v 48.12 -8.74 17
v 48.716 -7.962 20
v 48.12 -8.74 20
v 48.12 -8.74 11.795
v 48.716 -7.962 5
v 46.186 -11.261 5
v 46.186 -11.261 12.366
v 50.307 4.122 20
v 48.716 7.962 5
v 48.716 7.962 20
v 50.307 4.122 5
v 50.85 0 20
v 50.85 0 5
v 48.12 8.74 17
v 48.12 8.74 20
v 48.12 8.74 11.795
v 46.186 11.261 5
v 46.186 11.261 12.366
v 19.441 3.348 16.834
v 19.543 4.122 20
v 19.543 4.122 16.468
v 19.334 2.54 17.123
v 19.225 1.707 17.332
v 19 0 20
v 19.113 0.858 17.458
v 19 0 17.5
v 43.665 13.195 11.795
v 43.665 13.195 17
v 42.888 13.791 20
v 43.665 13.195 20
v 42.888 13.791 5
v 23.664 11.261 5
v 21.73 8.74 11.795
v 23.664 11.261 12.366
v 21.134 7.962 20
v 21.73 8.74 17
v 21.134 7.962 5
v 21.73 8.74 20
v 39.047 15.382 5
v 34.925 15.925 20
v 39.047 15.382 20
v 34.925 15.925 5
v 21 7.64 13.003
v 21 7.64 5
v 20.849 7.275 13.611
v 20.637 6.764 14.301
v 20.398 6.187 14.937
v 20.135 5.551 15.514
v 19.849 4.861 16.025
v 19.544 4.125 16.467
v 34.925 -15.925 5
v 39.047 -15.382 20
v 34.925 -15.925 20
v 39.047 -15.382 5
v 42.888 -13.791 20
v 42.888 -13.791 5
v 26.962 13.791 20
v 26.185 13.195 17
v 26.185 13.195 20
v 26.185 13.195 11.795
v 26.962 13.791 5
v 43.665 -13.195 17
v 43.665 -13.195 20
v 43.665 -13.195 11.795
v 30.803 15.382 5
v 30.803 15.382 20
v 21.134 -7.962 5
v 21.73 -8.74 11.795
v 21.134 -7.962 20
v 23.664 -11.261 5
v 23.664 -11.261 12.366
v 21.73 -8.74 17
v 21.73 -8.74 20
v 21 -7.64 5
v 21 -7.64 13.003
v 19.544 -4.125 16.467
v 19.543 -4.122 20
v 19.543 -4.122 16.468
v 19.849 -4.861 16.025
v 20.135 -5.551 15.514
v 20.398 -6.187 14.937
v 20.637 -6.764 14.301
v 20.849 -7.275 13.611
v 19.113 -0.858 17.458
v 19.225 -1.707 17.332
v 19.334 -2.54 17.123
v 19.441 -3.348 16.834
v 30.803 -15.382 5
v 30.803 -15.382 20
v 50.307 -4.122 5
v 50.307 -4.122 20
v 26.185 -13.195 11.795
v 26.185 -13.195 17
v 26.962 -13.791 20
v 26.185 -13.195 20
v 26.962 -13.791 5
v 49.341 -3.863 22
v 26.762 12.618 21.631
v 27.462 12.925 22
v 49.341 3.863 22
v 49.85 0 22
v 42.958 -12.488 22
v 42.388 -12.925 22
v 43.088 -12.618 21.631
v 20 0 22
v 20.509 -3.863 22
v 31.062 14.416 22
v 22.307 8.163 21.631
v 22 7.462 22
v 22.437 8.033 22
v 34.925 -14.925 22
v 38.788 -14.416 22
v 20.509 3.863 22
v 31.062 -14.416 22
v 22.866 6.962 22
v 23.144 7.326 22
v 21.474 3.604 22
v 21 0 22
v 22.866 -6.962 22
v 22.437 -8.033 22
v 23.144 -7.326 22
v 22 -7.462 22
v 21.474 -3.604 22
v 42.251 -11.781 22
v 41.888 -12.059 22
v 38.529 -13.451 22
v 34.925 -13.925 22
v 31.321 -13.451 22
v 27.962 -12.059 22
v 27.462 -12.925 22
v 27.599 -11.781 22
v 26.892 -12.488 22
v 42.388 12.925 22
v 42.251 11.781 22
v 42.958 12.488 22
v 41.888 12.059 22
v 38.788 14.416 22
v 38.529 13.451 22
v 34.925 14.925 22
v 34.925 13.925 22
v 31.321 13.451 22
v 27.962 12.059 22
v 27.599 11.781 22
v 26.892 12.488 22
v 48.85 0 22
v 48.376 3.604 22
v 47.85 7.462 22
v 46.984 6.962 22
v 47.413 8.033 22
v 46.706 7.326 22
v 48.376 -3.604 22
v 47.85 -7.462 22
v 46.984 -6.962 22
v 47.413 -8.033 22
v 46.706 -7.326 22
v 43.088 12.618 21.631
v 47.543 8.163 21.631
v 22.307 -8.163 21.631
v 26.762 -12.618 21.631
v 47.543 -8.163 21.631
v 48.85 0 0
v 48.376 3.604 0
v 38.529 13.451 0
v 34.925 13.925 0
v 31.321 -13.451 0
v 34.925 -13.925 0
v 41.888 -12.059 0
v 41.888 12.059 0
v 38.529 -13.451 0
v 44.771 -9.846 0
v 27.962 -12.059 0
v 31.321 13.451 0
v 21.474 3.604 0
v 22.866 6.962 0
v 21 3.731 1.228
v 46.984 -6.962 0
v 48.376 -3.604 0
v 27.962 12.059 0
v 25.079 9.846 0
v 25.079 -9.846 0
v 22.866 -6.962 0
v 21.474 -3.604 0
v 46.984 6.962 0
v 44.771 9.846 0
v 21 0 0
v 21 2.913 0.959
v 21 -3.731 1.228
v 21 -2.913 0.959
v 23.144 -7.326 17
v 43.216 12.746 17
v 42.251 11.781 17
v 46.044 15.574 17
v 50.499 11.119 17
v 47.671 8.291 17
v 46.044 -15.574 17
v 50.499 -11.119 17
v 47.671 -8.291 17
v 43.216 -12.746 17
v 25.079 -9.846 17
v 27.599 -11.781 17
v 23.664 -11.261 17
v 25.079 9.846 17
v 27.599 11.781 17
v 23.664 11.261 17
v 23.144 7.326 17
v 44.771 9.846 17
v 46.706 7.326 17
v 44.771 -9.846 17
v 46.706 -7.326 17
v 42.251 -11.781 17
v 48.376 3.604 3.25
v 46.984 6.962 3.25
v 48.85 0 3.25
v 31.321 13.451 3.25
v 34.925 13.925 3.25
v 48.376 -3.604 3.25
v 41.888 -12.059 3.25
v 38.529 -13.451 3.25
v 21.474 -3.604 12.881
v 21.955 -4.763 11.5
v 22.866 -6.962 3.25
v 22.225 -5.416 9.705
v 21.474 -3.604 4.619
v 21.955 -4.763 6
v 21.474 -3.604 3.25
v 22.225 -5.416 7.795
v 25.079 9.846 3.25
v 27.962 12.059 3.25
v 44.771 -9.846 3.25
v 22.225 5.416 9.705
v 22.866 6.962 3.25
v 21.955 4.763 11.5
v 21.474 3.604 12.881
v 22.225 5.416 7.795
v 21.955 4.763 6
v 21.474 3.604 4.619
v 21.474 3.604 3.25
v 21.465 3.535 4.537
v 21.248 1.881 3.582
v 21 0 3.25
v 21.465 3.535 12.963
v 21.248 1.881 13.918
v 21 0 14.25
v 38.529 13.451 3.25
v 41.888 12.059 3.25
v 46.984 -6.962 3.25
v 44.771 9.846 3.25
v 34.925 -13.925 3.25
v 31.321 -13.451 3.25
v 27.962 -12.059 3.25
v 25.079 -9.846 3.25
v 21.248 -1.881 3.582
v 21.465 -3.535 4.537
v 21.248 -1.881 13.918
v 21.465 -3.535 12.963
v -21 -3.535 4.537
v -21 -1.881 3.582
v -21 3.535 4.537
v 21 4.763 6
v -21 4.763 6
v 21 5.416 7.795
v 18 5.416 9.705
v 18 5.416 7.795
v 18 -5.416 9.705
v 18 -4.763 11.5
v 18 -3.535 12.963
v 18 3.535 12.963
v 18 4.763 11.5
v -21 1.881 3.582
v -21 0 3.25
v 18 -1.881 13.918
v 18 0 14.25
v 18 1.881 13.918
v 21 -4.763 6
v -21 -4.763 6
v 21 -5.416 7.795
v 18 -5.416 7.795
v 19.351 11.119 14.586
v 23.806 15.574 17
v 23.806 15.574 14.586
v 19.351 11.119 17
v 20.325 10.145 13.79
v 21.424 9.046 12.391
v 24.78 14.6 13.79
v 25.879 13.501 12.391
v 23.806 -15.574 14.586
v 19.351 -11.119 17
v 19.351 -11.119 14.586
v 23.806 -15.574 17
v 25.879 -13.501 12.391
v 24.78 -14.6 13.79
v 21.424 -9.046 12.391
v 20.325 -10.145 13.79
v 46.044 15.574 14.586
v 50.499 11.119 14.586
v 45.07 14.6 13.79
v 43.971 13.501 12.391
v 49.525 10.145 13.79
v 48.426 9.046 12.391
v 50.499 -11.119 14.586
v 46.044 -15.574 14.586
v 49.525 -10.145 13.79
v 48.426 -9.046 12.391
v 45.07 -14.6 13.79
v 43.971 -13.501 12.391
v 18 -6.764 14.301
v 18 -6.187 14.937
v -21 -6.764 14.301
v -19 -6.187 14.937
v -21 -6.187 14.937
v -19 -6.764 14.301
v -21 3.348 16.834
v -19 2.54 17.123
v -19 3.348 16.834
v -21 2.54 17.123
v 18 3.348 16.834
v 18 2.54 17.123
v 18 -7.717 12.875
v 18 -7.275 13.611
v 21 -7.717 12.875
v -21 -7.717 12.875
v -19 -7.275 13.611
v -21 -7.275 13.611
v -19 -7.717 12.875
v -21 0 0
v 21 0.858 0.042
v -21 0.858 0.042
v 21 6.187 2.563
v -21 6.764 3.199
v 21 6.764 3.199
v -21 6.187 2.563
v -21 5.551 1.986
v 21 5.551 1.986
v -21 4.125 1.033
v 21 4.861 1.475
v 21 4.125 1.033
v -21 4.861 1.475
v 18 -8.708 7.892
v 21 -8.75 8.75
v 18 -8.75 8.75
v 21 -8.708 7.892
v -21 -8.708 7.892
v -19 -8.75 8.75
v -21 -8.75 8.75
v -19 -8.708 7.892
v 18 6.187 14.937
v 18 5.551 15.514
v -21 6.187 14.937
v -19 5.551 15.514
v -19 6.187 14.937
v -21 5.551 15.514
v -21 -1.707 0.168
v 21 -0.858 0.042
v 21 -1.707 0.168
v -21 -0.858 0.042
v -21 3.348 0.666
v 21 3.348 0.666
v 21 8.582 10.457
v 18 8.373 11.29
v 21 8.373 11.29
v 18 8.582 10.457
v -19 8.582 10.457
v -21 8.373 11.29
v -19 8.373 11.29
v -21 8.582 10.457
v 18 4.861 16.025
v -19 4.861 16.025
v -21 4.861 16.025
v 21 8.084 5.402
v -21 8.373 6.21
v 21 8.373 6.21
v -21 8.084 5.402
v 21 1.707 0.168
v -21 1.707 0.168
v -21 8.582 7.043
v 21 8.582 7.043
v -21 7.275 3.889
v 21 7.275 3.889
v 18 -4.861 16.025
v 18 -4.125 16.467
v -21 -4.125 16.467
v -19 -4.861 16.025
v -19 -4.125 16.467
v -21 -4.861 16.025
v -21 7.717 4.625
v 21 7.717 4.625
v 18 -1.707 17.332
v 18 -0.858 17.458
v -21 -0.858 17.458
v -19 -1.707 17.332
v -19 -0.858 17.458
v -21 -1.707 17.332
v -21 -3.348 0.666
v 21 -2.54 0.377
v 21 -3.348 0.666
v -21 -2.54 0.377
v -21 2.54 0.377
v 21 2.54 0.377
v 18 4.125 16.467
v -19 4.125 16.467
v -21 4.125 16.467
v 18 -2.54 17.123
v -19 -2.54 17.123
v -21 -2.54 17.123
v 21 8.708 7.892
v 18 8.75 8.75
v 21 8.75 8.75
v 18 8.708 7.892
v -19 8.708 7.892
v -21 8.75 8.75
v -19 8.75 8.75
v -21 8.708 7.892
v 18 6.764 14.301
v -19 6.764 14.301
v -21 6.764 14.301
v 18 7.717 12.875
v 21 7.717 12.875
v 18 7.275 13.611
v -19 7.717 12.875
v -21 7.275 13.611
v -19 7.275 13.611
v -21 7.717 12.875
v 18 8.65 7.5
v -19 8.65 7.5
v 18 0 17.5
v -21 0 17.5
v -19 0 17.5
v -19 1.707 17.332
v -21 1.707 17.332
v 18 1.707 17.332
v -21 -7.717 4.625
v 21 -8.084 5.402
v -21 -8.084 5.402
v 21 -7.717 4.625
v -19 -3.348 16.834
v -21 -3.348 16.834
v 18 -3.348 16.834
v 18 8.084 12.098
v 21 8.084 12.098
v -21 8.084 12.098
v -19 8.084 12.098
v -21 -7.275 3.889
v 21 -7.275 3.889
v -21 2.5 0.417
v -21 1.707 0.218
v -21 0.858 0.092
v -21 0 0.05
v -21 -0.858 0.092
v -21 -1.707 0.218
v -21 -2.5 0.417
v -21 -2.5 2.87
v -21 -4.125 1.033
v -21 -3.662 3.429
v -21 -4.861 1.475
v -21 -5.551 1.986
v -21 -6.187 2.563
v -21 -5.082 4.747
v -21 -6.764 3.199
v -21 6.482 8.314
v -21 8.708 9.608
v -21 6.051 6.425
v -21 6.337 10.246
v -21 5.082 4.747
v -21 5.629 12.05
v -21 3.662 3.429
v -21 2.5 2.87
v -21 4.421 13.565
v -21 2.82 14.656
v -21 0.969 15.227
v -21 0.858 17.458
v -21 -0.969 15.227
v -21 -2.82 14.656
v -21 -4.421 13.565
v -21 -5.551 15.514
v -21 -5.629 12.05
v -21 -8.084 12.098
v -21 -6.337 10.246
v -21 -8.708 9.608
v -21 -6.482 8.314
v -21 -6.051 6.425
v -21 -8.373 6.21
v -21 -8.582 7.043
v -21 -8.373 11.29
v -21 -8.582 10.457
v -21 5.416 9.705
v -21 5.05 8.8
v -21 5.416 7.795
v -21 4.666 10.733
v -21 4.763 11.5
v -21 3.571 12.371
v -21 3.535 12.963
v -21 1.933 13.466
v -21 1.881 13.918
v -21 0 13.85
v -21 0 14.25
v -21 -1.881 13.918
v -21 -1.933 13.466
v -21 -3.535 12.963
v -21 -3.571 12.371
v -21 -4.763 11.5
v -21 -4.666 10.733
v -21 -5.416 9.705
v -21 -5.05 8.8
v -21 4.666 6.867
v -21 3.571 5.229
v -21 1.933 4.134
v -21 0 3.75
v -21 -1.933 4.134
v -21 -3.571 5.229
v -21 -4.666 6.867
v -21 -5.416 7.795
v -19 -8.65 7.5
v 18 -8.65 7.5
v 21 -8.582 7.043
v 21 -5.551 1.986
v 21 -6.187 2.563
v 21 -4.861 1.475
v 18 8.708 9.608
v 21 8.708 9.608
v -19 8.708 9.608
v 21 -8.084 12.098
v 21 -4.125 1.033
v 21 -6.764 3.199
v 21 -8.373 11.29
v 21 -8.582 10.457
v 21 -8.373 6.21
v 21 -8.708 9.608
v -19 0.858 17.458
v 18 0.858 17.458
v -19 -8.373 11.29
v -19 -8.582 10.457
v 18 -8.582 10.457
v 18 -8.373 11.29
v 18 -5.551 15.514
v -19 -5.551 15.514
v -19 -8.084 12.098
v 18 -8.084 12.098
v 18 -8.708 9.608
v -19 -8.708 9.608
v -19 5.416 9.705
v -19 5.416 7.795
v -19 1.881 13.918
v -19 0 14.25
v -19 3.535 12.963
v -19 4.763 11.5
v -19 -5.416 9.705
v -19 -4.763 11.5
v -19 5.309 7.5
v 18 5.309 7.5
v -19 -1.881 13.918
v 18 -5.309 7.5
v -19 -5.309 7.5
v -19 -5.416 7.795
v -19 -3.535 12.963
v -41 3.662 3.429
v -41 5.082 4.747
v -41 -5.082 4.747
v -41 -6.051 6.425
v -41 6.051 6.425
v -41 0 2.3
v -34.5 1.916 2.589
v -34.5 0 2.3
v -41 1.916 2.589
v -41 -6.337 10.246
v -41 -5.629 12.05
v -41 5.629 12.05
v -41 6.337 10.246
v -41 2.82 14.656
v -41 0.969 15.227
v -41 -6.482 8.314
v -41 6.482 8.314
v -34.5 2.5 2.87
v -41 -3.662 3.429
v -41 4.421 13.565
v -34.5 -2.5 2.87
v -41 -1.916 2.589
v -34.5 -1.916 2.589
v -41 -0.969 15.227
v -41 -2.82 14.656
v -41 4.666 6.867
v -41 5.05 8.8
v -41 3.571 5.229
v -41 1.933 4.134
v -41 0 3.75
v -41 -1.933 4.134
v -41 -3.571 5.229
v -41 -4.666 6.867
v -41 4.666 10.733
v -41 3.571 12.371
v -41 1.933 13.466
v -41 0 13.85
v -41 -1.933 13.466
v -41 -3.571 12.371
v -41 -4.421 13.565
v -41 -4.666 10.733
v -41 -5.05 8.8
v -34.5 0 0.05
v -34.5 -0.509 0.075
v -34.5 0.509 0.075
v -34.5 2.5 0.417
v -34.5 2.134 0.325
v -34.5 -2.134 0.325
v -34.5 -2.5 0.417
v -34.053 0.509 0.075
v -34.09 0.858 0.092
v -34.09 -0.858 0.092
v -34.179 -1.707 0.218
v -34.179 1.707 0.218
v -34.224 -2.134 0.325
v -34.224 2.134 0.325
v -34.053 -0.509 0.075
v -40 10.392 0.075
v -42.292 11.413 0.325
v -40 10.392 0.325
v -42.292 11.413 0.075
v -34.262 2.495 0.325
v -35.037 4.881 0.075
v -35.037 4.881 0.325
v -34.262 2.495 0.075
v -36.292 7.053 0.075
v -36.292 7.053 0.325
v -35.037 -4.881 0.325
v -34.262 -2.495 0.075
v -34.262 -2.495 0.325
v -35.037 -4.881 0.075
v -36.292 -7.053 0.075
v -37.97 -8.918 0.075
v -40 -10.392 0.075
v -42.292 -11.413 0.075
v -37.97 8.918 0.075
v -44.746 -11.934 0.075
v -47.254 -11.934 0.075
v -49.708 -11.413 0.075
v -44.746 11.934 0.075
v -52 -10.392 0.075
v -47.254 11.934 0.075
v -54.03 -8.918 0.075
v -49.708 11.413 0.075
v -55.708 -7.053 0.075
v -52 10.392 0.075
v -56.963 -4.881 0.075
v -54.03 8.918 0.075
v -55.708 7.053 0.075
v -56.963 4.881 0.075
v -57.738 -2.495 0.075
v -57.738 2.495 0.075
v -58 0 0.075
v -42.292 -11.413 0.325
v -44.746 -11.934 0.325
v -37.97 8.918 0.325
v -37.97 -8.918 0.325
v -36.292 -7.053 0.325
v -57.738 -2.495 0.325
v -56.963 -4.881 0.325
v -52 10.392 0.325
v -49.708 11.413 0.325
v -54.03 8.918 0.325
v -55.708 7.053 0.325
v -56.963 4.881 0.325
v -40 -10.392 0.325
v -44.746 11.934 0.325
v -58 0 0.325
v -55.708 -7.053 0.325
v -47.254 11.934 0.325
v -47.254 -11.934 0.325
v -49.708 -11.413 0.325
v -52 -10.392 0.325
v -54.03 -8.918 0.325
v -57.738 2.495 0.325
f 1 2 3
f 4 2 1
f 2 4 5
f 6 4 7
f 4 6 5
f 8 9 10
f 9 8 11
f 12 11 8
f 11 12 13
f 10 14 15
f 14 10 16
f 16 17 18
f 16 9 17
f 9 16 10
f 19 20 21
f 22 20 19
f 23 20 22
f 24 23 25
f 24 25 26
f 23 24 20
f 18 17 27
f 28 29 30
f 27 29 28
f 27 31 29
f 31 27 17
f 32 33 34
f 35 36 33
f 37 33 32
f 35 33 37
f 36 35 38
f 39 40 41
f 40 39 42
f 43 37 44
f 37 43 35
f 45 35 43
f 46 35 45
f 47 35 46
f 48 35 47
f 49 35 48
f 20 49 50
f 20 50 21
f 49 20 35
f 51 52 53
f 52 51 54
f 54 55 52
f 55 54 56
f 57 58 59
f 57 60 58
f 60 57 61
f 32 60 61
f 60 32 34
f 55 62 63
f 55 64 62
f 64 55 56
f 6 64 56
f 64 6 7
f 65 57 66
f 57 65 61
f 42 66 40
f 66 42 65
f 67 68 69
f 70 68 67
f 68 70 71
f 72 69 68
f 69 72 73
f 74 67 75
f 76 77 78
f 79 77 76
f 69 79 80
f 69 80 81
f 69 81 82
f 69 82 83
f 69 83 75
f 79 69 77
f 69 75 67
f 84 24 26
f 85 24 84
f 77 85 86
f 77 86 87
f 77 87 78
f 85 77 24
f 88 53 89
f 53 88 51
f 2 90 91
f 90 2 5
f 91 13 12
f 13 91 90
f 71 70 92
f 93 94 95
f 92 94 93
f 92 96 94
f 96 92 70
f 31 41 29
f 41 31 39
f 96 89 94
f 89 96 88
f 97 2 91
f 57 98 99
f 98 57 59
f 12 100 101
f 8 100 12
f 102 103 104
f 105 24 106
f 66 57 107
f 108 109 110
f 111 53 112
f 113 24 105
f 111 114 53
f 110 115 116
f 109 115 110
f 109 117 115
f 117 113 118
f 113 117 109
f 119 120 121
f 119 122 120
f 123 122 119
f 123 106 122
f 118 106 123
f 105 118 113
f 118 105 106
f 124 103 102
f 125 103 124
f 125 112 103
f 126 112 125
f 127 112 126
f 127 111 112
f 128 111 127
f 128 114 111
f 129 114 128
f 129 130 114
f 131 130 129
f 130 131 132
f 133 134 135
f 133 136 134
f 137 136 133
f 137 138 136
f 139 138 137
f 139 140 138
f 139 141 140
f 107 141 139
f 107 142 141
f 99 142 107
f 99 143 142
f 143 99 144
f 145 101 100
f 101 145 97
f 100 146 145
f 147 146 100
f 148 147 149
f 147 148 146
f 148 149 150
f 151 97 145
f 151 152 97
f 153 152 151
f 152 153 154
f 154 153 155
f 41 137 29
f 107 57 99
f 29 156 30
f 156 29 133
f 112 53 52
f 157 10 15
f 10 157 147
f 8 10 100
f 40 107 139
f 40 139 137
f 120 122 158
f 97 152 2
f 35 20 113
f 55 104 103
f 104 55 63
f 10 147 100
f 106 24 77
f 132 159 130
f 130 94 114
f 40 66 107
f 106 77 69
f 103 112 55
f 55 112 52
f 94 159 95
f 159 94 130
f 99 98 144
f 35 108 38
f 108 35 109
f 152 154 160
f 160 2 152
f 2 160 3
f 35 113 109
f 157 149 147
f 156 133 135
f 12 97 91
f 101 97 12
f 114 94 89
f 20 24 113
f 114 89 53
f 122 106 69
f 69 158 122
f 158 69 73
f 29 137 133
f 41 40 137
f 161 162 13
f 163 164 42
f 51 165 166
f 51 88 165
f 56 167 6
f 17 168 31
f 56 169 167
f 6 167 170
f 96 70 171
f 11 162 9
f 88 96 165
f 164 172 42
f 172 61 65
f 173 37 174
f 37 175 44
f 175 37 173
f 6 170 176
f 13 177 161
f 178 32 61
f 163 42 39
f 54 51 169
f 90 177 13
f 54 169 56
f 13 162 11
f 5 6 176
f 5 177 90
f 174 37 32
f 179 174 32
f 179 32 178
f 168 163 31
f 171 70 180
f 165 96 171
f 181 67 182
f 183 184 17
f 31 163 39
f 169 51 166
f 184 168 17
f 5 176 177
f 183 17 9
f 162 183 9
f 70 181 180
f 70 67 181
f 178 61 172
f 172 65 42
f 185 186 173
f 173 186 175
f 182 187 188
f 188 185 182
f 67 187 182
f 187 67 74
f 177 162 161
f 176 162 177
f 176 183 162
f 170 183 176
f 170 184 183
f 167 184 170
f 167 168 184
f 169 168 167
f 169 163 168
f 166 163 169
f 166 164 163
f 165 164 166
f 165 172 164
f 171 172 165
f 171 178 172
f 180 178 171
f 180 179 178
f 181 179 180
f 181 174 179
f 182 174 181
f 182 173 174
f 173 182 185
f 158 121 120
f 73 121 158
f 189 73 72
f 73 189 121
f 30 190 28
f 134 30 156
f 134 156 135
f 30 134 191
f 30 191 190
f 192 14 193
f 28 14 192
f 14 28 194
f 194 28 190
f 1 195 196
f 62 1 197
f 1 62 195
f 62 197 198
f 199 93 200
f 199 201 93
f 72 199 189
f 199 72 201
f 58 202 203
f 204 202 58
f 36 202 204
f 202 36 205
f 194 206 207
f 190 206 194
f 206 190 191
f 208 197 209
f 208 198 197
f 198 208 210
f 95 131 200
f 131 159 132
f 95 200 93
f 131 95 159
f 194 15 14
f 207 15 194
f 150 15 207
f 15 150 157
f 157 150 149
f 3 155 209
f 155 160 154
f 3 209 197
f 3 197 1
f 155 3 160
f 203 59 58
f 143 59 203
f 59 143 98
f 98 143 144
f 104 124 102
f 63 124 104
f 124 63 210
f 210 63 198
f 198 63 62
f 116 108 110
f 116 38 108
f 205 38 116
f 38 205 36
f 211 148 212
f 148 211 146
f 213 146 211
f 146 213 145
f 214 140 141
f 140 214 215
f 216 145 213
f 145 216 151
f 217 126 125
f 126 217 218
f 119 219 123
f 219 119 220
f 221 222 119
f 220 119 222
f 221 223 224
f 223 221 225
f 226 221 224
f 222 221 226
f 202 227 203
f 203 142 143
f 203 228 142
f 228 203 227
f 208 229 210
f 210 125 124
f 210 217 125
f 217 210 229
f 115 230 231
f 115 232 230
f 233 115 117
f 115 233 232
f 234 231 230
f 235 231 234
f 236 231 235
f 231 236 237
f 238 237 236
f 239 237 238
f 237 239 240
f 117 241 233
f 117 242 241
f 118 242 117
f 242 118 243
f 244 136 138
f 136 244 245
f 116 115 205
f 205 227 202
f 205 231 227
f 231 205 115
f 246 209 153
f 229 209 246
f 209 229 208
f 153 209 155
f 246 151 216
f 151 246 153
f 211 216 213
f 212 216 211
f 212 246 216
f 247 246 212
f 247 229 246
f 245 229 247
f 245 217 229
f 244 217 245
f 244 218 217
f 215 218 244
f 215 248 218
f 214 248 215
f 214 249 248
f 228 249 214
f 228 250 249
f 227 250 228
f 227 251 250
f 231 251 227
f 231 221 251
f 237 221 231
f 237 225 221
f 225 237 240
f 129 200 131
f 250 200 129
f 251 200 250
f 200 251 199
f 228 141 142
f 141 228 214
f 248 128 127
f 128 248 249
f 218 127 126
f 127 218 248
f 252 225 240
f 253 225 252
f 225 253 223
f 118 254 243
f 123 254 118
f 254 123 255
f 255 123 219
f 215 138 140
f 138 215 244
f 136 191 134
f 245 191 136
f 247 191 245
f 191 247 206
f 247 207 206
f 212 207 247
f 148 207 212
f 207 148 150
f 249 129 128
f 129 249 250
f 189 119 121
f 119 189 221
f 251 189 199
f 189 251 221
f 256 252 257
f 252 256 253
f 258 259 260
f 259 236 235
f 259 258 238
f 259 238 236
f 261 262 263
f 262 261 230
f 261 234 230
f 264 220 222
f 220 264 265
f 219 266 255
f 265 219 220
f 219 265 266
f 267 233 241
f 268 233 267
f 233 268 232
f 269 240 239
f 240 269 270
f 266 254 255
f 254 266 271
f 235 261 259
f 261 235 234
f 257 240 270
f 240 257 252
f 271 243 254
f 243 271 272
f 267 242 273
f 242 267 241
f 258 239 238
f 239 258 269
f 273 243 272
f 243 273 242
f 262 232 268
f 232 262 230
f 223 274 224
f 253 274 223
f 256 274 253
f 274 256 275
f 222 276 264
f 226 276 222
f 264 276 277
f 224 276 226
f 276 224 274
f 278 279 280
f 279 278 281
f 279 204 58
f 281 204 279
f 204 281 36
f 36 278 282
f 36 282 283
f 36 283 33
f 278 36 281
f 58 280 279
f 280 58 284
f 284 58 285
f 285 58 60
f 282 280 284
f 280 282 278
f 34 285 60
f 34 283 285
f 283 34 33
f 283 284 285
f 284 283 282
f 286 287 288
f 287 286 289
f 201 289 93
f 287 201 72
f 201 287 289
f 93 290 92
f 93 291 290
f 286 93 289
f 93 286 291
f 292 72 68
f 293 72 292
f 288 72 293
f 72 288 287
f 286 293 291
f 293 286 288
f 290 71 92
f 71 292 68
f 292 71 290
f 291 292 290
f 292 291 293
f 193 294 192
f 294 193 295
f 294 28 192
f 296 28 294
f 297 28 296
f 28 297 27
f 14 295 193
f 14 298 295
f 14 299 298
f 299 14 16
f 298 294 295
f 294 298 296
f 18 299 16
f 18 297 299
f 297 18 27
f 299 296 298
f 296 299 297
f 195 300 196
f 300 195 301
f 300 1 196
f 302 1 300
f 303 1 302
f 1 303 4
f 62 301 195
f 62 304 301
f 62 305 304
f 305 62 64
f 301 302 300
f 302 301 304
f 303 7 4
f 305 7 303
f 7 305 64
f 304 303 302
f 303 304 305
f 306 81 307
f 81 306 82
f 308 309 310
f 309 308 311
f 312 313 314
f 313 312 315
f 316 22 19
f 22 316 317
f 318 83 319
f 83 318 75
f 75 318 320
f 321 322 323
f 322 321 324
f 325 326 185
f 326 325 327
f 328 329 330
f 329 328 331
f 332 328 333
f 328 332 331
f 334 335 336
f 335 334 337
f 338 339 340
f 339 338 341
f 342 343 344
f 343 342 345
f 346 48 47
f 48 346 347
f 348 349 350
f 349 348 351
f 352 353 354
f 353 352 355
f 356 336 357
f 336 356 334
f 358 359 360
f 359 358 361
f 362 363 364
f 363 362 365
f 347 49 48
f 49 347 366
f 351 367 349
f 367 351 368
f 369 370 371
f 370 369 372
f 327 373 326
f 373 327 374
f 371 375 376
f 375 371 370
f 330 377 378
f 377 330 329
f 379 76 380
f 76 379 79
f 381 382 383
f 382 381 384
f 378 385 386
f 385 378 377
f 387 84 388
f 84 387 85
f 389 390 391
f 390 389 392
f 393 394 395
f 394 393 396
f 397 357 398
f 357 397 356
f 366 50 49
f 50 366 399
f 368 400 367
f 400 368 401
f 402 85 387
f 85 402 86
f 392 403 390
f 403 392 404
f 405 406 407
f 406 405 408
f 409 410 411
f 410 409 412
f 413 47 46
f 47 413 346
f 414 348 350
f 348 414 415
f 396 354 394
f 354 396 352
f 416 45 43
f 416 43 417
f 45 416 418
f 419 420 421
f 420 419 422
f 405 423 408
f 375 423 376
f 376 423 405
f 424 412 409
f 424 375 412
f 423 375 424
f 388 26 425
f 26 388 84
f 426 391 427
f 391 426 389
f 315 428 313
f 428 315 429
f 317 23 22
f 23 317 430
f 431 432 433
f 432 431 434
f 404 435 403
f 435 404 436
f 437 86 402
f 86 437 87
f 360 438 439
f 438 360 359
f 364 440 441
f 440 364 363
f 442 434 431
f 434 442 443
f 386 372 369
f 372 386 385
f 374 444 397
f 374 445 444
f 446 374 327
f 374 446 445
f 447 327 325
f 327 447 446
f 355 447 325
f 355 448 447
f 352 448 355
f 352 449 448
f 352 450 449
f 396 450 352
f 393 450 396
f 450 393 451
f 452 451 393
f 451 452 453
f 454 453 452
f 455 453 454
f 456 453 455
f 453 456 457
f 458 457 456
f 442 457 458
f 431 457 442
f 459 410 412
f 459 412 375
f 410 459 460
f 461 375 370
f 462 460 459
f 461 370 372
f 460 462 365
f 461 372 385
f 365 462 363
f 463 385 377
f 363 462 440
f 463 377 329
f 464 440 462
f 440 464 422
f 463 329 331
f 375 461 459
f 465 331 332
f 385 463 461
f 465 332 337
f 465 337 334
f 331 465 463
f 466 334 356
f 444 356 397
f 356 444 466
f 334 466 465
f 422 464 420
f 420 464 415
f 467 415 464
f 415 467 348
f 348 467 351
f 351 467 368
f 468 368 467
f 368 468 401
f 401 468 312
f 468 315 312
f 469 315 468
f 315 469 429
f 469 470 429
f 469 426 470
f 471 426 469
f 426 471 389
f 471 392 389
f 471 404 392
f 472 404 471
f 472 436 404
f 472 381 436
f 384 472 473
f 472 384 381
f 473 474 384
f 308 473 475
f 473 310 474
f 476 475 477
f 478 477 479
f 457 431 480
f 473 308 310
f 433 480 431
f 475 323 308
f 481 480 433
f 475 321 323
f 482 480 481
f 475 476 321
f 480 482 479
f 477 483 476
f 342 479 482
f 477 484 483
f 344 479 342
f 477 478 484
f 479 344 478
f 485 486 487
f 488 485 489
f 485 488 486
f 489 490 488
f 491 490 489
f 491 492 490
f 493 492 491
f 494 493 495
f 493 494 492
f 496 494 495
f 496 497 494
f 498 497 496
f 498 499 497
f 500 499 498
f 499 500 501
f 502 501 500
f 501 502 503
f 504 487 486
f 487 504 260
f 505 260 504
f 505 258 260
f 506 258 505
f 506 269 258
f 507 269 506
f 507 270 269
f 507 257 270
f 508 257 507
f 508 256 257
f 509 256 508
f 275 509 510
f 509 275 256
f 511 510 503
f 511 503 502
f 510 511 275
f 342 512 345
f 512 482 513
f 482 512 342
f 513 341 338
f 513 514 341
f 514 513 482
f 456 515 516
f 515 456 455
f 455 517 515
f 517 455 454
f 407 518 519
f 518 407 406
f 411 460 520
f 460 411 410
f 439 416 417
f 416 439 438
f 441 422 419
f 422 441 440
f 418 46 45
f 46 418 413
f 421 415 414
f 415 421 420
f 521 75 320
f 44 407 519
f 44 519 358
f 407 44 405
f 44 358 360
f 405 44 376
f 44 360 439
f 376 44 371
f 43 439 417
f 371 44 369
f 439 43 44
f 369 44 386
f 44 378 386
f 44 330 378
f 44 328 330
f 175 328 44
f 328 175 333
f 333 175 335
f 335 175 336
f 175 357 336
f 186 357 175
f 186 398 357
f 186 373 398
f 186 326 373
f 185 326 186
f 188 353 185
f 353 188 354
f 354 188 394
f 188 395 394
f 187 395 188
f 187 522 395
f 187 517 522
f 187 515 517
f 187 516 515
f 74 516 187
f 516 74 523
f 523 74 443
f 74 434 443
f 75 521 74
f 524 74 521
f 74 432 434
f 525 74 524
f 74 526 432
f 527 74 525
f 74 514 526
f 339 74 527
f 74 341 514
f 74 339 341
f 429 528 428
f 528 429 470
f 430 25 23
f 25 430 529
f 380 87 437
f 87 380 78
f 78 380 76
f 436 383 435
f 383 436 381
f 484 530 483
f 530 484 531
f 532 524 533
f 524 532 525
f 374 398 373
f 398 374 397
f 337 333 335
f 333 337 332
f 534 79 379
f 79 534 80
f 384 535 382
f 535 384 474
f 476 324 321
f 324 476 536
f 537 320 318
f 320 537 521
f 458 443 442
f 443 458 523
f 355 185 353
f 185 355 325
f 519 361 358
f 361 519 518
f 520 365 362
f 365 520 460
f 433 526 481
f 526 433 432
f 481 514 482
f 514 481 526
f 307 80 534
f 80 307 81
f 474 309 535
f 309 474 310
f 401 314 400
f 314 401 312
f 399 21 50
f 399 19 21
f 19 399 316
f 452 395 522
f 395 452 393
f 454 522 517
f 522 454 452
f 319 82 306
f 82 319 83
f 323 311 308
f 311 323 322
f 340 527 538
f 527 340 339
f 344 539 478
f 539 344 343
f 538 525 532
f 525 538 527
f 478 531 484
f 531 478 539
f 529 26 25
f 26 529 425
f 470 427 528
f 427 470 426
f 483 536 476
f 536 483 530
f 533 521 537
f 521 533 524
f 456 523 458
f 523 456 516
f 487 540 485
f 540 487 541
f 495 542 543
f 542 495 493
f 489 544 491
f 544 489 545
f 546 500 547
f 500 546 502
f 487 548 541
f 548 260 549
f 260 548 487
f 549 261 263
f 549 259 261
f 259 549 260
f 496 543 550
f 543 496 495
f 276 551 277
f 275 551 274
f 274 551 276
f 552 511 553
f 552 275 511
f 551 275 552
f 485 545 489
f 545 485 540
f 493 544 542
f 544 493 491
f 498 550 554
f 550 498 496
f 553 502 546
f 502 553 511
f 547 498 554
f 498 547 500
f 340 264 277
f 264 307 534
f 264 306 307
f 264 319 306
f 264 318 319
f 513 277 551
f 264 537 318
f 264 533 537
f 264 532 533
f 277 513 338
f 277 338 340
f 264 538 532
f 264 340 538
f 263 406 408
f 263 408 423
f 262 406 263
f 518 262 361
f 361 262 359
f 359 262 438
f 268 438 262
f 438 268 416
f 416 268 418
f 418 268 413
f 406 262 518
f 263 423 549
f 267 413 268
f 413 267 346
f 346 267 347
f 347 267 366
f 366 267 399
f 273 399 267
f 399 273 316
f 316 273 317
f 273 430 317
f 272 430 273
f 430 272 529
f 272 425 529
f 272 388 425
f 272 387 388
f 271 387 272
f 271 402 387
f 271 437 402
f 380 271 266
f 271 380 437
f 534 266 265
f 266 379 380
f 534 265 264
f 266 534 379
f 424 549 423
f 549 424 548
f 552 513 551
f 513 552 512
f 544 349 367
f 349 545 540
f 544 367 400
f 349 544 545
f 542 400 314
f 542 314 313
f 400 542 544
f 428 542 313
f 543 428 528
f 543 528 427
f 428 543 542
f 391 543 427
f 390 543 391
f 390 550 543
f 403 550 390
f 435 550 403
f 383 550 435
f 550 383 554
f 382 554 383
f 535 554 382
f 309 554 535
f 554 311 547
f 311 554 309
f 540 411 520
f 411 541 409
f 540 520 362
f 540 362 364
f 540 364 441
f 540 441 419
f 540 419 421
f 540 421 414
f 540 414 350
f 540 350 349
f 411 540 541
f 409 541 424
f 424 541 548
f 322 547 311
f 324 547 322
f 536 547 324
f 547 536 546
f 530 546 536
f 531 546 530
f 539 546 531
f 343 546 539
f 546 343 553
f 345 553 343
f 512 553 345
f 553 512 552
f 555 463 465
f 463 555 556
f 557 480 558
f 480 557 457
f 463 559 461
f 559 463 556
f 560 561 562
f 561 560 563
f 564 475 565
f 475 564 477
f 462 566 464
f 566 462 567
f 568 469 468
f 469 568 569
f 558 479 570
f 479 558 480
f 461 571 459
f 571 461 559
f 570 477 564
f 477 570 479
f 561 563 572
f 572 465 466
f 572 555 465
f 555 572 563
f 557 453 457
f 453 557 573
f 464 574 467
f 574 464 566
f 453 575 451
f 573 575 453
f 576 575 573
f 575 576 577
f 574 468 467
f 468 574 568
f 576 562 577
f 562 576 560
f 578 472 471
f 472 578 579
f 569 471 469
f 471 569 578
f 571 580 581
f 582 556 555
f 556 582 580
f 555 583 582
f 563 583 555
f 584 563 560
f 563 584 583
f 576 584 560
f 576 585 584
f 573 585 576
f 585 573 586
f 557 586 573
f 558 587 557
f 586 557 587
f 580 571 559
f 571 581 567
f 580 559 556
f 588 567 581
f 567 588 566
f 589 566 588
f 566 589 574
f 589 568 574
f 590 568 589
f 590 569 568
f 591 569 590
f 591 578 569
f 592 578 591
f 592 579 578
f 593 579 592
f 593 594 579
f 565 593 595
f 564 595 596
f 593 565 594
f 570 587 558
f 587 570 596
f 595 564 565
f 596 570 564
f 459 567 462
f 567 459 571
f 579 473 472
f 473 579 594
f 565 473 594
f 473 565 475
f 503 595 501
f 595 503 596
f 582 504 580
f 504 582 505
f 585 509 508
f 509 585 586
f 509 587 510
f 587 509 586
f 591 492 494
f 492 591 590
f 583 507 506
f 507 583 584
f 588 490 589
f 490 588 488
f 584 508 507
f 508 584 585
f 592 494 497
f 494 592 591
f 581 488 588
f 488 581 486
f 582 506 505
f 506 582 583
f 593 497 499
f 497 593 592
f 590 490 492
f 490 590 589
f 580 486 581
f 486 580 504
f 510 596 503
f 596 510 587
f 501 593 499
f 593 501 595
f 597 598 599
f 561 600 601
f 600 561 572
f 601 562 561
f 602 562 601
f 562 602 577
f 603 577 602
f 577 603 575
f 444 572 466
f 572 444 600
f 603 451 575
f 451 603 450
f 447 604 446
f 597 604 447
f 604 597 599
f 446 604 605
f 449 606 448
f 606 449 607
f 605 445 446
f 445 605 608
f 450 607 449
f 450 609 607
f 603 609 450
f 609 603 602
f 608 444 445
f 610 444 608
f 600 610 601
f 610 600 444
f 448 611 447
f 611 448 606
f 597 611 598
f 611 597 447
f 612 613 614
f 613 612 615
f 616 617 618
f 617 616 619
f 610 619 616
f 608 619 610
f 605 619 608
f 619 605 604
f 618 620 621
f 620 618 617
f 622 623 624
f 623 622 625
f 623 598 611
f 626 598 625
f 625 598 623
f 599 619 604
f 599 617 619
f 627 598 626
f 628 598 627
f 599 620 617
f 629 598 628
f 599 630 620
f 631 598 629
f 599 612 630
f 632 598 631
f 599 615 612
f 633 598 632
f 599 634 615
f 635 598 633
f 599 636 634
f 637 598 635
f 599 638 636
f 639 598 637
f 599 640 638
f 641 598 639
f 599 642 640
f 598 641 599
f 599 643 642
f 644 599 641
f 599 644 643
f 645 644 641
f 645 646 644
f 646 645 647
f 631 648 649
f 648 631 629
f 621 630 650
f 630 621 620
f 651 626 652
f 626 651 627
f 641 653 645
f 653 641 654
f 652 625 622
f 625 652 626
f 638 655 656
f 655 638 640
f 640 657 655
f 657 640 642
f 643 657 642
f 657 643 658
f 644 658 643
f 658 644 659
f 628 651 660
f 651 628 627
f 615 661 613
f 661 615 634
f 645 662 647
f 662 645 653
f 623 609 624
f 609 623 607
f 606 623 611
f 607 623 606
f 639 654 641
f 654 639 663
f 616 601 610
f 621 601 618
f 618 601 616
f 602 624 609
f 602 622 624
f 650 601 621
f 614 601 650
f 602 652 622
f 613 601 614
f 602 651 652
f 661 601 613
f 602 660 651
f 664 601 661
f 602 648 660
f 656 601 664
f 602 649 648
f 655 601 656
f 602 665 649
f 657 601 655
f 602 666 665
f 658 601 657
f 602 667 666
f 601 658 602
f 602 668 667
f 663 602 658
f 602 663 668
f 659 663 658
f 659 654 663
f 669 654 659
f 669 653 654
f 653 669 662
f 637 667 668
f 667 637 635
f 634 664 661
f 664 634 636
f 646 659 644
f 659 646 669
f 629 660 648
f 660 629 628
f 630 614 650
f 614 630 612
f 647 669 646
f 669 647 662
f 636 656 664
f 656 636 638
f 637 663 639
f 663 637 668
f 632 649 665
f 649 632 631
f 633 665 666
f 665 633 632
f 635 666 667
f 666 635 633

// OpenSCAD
2204_14t_dia = 27.75;
hk_810_10a_l = 37.0;
hk_810_10a_w = 19.0;

motor_cup_dia = 2204_14t_dia + .10;
motor_cup_th  = 2.0;
esc_w = hk_810_10a_w;
esc_l = hk_810_10a_l + 3 + 2;

tab_width = 6 + 0.3;



color([ .50, .63, .93 , 0.90])
//translate( [ 37.45, 0, 5.0])
translate( [ (esc_l/2) + (motor_cup_dia/2), 0, 5.0])
2204_cup();


color([ .50, .63, .93 , 0.90])
translate( [ -(esc_l/2), 0, 8.75])
esc_arm();

color([ .50, .63, .93 , 0.90])
translate( [ -(esc_l/2) - 20, 0, 8.8])
connector();


//old modifications to original
//tab_holes();
//color([ 0.55, 0.40, 0.45, 0.60])
//tab_holders();
//wider_hole();

//show_orig();

//add pad to prevent curling
color([ .50, .63, .93 , 0.60])
translate( [-46, 0, 0.20])
cylinder(r=12, h=0.25, center=true) ;



module connector() {

	difference() {
		rotate([ 0, 90, 0])
		cylinder(r=6.5, h=20);

		translate( [-1, 0, 0])
		rotate([ 0, 90, 0])
		cylinder(r=5.05, h=20 + 2);

	}

	block_h =3;
	intersection() {
		translate([ 7 + ( 10 - (7/2)) ,  0 ,  (-6.5) - block_h/4 ] )
		//translate([ 7.5 + 7  ,  0 ,  (-6.5) - block_h/4 ] )
		cube( [14, 5, block_h], center=true);

		rotate([ 0, 90, 0])
		cylinder(r=8.75, h=esc_l, $fn=64);
	}

}

module esc_arm() {
	
	difference() {
		rotate([ 0, 90, 0])
		cylinder(r=8.75, h=esc_l, $fn=64);

		translate( [-1, 0, 0])
		rotate([ 0, 90, 0])
		cylinder(r=5.5, h=esc_l + 2);

		translate([ (esc_l/2)-0.5, 0, (4.5/2) + 3.0])
		cube([ esc_l - 5, esc_w , 9 + 4], center=true);
	}

}

module 2204_cup() {

	m_cup_r = motor_cup_dia/2;
	m_cup_th = motor_cup_th;
	difference() {
		union() {
		cylinder(r=m_cup_r + m_cup_th, h=15, $fn=24);

		translate([ 0, 0, 15])
		cylinder(r1=m_cup_r + m_cup_th, r2=m_cup_r + 1.0, h=2, $fn=24);

		translate([ 0, 0, -5])
		cylinder(r2=m_cup_r + m_cup_th, r1=m_cup_r , h=5, $fn=24);
		}

		translate([ 0, 0, -1.75] )
		cylinder(r=m_cup_r, h=24, $fn=24);

		//cable door
		translate( [-m_cup_r - m_cup_th, 0, 3.75])
		rotate([ 0, 90, 0])
		cylinder(r=5.5, h=5);


		tab_holes();

		//cable allowance
//		translate([ - m_cup_r + 0.5, 0, 10])
//		cylinder( r=2, h=10);
	}

	tab_holders();
}

module show_orig() {

//	translate([ 0, 1.3, 0])
	color([ 0.85, 0.40, 0.45, 0.35])
	import(file="PL2Q_Hugin_motormount.stl");
}



//widen hole
module wider_hole() {
	translate( [ -40, 0, 8.5])
	rotate([ 0, 90, 0])
	color([ .90, .33, .33 , .60])
	cylinder(r=4.5, h=30);

	translate( [ 17, 0, 9.0])
	rotate([ 0, 90, 0])
	color([ .90, .33, .33 , .60])
	cylinder(r=5.5, h=10);

	translate( [ 37.45, 0, 9.0])
	rotate([ 0, 0, -6])
	color([ .80, .23, .73 , .50])
	cylinder(r=15.275, h=15, $fn=24);


}

//subtract holes
module tab_holes() {

	center_of_mount = [0, 0, 15.0];

	translate( center_of_mount)
	rotate([ 0, 0, 45])
	//color([ 0.45, 0.10, 0.90, 0.30])
	cube([50, tab_width, 6], true);

	translate( center_of_mount)
	rotate([ 0, 0, -45])
	//color([ 0.45, 0.10, 0.90, 0.30])
	cube([50, tab_width, 6], true);

}


module tab_holders() {
	center_of_mount = [0, 0, 09.0];


	translate( center_of_mount )
	rotate(135, [0,0,1])
	translate( [(2204_14t_dia/2 - motor_cup_th -0.5)  + 5.5, 0, 0])
	motor_tab();

	translate( center_of_mount )
	rotate(-135, [0,0,1])
	translate( [(2204_14t_dia/2 - motor_cup_th -0.5)  + 5.5, 0, 0])
	motor_tab();



	translate( center_of_mount )
	rotate(45, [0,0,1])
	translate( - center_of_mount )
	translate( center_of_mount )
	translate( [(2204_14t_dia/2 - motor_cup_th -0.5)  + 5.5, 0, 0])
	motor_tab();

	translate( center_of_mount )
	rotate(-45, [0,0,1])
	translate( - center_of_mount )
	translate( center_of_mount )
	translate( [(2204_14t_dia/2 - motor_cup_th -0.5)  + 5.5, 0, 0])
	motor_tab();
}


module motor_tab() {
	difference() {

		cube([6 - motor_cup_th, tab_width, 6], true);

		translate( [6.5, -6, -8.3])
		rotate([ 0, 90, 90])
		cylinder(r=10, h=10);

/*
		translate( [-13.0, -6, -7])
		rotate([ 0, 90, 90])
		cylinder(r=11, h=10);
*/

/*
		translate( [0, 0, -5])
		cube([6, 6, 6], true);
*/

	}
}
